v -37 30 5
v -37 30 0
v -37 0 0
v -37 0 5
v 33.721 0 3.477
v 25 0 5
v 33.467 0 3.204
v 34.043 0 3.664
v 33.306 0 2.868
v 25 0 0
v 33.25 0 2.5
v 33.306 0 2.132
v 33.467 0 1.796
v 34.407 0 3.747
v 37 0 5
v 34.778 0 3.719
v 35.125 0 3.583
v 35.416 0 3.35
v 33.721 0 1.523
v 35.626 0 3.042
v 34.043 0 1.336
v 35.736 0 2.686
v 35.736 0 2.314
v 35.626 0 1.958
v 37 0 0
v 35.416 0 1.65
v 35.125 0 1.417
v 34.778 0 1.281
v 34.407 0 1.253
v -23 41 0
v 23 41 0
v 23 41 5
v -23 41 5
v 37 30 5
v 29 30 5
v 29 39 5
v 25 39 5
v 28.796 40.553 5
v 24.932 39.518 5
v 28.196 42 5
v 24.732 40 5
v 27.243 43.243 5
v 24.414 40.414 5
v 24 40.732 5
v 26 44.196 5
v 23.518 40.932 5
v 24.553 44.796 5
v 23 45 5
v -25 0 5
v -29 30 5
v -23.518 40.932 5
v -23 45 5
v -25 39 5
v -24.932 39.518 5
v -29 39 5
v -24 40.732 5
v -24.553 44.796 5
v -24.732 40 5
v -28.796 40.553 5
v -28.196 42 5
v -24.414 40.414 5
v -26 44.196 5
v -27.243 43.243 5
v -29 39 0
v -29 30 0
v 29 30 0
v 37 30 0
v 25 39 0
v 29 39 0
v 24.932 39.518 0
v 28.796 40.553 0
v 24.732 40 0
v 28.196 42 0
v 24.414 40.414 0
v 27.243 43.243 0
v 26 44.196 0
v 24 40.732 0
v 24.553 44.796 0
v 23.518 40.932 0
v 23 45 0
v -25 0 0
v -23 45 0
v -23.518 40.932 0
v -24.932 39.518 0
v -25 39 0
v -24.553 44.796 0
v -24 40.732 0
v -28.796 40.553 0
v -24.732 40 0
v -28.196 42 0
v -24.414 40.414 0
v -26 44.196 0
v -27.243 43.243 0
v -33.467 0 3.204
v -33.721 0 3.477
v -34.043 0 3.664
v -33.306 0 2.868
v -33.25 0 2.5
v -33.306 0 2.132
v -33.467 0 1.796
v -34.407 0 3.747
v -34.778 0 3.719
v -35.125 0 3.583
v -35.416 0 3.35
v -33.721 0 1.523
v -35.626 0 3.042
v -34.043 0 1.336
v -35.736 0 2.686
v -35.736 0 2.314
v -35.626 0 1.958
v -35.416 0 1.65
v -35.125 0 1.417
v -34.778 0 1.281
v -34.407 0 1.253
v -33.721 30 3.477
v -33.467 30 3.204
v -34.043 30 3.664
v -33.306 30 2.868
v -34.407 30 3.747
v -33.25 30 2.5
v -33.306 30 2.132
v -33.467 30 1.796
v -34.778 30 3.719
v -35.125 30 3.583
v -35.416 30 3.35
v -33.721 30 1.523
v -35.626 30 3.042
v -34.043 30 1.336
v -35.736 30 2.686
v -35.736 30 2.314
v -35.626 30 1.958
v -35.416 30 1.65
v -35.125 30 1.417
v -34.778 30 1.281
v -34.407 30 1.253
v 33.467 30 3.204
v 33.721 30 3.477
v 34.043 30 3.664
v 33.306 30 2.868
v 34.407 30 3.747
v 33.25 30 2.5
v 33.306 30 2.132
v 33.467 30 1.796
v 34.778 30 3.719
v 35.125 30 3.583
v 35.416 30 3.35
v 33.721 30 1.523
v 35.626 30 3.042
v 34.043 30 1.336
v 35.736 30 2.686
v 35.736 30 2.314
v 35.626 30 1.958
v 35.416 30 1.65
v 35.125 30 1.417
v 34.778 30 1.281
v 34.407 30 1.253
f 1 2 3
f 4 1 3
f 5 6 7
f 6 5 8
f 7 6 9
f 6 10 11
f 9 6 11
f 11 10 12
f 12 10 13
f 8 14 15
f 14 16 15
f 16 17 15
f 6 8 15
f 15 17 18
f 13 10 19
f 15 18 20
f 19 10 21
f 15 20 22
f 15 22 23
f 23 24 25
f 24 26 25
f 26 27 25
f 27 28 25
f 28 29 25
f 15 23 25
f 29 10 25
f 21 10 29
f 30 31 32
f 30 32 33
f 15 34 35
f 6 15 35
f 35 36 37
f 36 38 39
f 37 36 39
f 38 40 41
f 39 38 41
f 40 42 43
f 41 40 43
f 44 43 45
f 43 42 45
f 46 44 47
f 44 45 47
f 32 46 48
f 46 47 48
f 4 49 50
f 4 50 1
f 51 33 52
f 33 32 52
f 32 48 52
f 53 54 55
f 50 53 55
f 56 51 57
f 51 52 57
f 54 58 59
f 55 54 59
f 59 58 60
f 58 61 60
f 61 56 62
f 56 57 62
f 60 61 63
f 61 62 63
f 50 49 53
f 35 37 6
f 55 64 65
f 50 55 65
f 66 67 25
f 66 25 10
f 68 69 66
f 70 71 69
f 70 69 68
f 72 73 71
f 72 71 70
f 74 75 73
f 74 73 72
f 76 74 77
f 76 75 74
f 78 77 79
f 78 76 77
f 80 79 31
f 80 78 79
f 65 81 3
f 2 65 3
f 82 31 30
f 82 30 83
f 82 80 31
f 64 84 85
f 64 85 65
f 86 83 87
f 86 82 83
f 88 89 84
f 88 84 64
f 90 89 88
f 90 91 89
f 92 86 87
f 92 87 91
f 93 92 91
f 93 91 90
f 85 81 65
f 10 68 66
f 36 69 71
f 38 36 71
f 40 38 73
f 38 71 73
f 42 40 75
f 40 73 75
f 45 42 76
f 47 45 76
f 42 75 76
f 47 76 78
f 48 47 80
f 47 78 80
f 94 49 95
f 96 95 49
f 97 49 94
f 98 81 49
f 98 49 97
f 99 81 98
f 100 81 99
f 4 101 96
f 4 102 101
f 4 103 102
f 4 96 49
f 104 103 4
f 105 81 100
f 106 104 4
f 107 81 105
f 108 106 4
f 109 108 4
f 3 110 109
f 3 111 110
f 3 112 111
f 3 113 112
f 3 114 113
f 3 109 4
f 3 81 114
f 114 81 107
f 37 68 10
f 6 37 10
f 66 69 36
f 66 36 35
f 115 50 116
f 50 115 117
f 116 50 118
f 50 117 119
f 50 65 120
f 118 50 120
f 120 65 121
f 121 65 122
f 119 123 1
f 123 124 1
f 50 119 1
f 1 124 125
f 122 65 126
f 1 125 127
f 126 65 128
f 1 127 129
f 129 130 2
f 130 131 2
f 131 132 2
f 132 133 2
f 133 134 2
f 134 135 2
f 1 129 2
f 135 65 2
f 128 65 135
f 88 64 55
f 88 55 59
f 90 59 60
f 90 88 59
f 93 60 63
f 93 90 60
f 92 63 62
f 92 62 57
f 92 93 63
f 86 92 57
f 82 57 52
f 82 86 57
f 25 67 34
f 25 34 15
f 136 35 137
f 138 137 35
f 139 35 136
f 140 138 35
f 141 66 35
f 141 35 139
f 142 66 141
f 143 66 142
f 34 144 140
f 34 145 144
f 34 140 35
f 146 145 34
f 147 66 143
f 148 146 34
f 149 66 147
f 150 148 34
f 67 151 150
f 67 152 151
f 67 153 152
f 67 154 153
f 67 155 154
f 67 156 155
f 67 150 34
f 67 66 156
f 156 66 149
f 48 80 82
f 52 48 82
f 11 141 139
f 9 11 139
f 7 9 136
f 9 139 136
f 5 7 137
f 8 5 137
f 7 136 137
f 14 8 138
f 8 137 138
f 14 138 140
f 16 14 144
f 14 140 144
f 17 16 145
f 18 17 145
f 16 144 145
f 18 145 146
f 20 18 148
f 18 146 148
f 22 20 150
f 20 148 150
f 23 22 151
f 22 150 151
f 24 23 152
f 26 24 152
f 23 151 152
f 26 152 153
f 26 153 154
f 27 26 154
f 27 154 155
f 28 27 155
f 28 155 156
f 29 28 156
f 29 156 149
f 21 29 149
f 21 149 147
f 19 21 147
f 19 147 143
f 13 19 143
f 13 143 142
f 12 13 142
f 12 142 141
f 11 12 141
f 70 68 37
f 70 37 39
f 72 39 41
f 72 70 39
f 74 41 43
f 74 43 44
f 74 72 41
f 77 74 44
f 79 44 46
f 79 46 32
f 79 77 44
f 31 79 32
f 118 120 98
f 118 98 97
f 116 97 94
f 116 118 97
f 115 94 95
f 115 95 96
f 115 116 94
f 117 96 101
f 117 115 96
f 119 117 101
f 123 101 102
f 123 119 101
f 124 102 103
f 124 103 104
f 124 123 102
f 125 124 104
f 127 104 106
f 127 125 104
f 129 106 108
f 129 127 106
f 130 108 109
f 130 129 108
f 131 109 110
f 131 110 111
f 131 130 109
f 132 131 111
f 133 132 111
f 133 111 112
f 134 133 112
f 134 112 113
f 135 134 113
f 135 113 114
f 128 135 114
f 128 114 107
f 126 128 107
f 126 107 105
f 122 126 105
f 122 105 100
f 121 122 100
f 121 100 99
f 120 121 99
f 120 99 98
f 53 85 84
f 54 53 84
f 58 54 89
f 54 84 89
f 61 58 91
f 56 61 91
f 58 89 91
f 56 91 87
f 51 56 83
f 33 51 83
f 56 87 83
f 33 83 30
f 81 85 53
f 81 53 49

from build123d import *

# Parameters (mm, degrees)
PAD_DEPTH    = 5
SKETCH001_R  = 1.25
POCKET_DEPTH = 30.001


with BuildPart() as part:
    # Sketch → Pad (new body)
    with BuildSketch(Plane.XY):
        with BuildLine():
            Line((0, 41), (23, 41))
            ThreePointArc((25, 39), (24.414214, 40.414214), (23, 41))
            Line((25, 39), (25, 0))
            Line((25, 0), (37, 0))
            Line((37, 30), (37, 0))
            Line((29, 30), (37, 30))
            Line((29, 39), (29, 30))
            ThreePointArc((29, 39), (27.242641, 43.242641), (23, 45))
            Line((0, 45), (23, 45))
            Line((0, 45), (0, 41))
        make_face()
    extrude(amount=PAD_DEPTH)

    # Sketch001 (on Face7 of Pad) → Pocket (cut, through all)
    with BuildSketch(Plane(origin=(0, 30, 0), x_dir=(-1, 0, 0), z_dir=(0, 1, 0))):
        with Locations((-34.5, 2.5)):
            Circle(SKETCH001_R)
    extrude(amount=-POCKET_DEPTH, mode=Mode.SUBTRACT)

    # Mirrored: part across YZ


with BuildPart() as part_1:
    add(part.part)
    add(part.part.mirror(Plane.YZ))


solid = part_1.part
